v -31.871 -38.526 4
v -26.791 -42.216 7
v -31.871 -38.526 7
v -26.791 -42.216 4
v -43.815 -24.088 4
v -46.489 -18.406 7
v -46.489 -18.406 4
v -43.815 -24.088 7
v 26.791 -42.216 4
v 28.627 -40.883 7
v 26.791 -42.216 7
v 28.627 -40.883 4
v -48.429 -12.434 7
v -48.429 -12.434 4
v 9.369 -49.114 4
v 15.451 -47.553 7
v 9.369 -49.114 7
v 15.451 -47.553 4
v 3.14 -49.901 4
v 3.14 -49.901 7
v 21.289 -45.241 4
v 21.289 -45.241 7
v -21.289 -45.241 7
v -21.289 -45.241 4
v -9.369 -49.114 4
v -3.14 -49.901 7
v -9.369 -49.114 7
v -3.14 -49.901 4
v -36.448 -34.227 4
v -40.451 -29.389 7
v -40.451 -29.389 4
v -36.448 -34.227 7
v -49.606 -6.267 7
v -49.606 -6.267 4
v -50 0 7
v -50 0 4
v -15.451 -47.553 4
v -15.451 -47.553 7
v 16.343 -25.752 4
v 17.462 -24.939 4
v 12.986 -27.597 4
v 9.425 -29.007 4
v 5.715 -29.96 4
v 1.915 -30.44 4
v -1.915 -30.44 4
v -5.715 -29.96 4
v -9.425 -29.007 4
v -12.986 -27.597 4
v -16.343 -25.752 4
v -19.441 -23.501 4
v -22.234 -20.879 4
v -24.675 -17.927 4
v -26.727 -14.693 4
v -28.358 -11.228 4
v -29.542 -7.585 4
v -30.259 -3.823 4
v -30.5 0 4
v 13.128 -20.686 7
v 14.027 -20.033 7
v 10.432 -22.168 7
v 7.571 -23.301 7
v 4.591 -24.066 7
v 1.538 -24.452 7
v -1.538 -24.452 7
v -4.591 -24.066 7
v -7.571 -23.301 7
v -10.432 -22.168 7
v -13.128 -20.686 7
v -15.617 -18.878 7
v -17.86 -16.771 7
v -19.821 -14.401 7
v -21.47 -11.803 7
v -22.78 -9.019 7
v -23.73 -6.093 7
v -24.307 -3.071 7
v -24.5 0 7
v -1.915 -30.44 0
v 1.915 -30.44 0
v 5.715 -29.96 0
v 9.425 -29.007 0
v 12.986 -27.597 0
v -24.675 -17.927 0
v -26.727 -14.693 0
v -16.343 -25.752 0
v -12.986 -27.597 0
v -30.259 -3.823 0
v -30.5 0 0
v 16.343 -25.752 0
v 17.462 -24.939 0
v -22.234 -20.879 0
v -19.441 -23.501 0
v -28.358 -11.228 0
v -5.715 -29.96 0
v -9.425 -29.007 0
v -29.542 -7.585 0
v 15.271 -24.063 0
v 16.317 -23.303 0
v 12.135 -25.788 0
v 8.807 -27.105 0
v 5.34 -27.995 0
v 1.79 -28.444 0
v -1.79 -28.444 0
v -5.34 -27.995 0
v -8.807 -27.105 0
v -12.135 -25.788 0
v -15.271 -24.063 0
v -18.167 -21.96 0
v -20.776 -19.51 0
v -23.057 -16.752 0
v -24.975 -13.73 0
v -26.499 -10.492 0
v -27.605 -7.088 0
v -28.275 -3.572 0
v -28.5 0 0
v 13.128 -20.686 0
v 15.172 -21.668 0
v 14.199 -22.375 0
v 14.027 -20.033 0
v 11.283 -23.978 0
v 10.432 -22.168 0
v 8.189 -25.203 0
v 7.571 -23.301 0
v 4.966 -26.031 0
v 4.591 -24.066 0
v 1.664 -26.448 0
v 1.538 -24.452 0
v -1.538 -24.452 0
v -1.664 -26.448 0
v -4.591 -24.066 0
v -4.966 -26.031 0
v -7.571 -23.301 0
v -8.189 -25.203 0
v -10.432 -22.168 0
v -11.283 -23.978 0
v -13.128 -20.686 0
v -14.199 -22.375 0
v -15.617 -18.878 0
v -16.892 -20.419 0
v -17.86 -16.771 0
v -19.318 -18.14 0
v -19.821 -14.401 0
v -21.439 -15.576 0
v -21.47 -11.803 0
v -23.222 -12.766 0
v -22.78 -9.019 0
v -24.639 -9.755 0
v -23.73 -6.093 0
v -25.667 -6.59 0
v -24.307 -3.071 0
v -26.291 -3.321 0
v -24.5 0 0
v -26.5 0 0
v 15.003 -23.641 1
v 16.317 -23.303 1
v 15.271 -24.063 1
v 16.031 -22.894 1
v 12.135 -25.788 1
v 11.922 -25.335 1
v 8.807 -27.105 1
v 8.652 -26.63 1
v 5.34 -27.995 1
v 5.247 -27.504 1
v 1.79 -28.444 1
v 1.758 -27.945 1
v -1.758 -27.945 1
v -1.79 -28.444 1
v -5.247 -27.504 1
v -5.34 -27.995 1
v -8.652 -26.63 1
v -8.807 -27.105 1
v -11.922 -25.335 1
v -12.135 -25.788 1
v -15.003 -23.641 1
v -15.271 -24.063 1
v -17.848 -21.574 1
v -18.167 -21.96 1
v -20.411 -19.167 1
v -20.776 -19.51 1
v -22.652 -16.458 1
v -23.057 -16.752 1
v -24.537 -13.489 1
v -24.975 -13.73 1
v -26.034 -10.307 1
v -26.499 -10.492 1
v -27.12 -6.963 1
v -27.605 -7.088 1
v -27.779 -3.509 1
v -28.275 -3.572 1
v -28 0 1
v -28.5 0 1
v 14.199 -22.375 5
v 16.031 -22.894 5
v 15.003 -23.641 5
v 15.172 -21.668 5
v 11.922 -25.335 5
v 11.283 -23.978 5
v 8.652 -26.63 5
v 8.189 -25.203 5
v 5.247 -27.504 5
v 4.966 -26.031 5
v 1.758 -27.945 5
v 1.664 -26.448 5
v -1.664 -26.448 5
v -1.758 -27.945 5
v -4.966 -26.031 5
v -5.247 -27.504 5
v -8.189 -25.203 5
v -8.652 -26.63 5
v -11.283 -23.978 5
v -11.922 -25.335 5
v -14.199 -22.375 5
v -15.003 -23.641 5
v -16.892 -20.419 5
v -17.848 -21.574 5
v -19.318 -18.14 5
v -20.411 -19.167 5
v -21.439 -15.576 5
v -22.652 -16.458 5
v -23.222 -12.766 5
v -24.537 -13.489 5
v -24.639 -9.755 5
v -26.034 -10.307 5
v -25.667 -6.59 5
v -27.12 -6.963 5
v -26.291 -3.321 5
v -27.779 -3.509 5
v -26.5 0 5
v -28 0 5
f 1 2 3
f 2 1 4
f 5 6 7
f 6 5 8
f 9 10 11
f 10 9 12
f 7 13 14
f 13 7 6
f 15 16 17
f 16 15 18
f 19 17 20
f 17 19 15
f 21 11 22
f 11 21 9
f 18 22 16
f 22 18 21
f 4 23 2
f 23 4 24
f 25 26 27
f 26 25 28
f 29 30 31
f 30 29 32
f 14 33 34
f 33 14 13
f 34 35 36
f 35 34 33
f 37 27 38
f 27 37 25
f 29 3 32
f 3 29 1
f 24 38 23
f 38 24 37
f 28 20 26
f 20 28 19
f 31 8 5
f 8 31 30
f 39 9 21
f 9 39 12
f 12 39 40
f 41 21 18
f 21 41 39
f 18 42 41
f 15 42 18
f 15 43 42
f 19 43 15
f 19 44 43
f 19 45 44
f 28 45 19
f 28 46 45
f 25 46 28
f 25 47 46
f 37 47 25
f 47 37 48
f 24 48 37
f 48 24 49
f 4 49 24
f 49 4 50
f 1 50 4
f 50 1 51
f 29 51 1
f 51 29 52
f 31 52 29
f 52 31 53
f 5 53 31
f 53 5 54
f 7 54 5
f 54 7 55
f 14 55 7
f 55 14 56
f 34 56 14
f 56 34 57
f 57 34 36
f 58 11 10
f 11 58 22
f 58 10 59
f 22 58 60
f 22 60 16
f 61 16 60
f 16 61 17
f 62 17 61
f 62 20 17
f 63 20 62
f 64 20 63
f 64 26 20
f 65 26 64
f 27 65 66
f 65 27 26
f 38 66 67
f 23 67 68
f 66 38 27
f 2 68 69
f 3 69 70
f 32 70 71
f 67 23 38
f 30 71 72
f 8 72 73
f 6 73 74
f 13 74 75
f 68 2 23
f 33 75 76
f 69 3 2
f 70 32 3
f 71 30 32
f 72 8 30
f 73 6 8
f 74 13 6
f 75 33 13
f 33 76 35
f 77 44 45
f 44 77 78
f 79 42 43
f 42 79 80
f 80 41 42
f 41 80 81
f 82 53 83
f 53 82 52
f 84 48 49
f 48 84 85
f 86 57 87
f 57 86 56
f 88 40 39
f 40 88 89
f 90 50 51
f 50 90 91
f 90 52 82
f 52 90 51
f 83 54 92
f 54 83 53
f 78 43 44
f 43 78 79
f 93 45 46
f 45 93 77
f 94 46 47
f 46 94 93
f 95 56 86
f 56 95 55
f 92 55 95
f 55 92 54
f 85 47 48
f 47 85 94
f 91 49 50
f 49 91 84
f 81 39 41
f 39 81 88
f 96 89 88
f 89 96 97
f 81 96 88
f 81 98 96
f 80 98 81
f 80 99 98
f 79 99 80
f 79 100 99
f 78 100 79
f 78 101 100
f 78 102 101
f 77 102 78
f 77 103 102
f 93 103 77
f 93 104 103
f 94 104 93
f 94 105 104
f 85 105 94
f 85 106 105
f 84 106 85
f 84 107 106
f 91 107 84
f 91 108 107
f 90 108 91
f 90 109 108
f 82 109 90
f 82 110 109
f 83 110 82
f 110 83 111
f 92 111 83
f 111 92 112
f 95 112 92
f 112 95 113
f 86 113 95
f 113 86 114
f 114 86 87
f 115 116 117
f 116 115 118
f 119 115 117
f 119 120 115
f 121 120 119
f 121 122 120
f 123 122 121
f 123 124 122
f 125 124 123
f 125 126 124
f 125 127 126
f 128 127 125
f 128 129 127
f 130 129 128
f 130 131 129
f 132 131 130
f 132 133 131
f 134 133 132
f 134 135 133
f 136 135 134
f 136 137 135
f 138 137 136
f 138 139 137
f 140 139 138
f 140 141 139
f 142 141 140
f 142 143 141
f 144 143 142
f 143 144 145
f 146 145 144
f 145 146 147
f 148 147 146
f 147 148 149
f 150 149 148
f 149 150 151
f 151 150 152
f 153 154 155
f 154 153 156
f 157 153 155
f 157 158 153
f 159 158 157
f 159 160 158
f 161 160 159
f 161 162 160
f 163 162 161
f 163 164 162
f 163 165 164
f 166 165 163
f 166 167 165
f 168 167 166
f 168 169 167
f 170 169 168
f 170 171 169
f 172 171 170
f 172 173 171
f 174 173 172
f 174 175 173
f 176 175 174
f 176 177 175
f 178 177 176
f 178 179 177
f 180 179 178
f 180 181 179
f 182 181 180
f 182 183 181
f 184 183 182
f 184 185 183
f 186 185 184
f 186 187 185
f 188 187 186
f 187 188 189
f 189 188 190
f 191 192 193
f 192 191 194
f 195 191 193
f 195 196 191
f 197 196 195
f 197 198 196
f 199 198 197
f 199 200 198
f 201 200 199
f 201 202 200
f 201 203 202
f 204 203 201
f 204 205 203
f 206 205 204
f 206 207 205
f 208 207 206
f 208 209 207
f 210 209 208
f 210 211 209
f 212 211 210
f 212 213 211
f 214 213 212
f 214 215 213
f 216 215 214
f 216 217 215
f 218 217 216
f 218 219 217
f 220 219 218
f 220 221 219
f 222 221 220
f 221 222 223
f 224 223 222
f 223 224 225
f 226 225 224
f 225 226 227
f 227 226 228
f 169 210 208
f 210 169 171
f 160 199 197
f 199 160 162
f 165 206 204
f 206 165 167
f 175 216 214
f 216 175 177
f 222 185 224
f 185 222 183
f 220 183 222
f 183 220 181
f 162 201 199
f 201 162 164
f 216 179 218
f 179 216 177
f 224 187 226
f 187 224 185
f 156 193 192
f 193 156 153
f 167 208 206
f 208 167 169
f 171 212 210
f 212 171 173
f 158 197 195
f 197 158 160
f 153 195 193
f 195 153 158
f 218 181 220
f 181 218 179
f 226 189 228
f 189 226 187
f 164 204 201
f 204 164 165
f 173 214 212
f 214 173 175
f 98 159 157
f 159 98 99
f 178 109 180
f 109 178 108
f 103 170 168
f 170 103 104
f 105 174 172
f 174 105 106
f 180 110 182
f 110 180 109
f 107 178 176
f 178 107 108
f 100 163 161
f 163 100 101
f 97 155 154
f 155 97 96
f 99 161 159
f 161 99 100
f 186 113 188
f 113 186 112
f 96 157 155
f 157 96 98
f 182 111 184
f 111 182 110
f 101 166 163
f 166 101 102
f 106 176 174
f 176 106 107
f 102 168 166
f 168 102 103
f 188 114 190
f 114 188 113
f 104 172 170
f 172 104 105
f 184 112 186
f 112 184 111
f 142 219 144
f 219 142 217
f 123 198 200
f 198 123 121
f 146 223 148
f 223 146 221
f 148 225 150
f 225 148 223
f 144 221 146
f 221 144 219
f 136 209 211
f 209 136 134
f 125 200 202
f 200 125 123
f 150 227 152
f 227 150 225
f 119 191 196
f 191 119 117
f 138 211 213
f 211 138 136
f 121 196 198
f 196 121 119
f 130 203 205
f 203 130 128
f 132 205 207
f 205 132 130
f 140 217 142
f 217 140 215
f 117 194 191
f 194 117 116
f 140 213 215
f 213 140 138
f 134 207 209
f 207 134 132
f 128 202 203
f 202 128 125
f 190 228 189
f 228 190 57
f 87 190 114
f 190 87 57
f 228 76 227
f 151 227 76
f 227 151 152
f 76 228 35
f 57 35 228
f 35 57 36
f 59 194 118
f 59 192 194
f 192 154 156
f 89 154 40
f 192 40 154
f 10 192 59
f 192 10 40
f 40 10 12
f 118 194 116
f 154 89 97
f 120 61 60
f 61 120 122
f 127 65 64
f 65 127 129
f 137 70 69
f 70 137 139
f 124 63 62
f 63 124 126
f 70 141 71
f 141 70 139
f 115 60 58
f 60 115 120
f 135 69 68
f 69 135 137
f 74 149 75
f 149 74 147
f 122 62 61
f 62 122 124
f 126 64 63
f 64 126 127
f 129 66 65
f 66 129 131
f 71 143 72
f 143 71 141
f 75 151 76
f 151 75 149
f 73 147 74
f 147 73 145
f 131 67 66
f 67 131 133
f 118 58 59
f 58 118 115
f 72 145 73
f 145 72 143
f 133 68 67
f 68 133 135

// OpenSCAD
$fn=50;
outerWidth=57;
wallWidth=4;
tabWidth=4;
hd=0.5; // holder distance
height = 5;

shelfHeight=3;
shelfWidth=100;

module hole()
{
	translate([0,0,-1]) cylinder(d=outerWidth-(wallWidth*2),h=tabWidth*3);
	
}

module shelf()
{
	translate([0,0,shelfHeight+1]) cylinder(d=shelfWidth,h=shelfHeight);
	cylinder(d=outerWidth+wallWidth,h=shelfHeight+tabWidth);
}

module mainCube()
{
	innerWidth = outerWidth - wallWidth;
	offset = (outerWidth - innerWidth) /2;
	
	difference()
	{
		union()
		{
			cylinder(d=outerWidth,h=height);
		}
		cylinder(d=innerWidth,h=height);
		translate([0,0, height - tabWidth]) difference()
		{
			cylinder(d=outerWidth+0.5,h=tabWidth);
			cylinder(d=outerWidth-(wallWidth/2)+1,h=tabWidth);
		}
		
	}
	
}
module cut()
{
	translate([shelfWidth/2 * -1,0,0]) cube([shelfWidth,shelfWidth,shelfHeight+tabWidth+2]);
 rotate([0,0,-55]) cube([shelfWidth,shelfWidth,shelfHeight+tabWidth+2]);
}

difference()
{
shelf();
mainCube();
	hole();
cut();
}
